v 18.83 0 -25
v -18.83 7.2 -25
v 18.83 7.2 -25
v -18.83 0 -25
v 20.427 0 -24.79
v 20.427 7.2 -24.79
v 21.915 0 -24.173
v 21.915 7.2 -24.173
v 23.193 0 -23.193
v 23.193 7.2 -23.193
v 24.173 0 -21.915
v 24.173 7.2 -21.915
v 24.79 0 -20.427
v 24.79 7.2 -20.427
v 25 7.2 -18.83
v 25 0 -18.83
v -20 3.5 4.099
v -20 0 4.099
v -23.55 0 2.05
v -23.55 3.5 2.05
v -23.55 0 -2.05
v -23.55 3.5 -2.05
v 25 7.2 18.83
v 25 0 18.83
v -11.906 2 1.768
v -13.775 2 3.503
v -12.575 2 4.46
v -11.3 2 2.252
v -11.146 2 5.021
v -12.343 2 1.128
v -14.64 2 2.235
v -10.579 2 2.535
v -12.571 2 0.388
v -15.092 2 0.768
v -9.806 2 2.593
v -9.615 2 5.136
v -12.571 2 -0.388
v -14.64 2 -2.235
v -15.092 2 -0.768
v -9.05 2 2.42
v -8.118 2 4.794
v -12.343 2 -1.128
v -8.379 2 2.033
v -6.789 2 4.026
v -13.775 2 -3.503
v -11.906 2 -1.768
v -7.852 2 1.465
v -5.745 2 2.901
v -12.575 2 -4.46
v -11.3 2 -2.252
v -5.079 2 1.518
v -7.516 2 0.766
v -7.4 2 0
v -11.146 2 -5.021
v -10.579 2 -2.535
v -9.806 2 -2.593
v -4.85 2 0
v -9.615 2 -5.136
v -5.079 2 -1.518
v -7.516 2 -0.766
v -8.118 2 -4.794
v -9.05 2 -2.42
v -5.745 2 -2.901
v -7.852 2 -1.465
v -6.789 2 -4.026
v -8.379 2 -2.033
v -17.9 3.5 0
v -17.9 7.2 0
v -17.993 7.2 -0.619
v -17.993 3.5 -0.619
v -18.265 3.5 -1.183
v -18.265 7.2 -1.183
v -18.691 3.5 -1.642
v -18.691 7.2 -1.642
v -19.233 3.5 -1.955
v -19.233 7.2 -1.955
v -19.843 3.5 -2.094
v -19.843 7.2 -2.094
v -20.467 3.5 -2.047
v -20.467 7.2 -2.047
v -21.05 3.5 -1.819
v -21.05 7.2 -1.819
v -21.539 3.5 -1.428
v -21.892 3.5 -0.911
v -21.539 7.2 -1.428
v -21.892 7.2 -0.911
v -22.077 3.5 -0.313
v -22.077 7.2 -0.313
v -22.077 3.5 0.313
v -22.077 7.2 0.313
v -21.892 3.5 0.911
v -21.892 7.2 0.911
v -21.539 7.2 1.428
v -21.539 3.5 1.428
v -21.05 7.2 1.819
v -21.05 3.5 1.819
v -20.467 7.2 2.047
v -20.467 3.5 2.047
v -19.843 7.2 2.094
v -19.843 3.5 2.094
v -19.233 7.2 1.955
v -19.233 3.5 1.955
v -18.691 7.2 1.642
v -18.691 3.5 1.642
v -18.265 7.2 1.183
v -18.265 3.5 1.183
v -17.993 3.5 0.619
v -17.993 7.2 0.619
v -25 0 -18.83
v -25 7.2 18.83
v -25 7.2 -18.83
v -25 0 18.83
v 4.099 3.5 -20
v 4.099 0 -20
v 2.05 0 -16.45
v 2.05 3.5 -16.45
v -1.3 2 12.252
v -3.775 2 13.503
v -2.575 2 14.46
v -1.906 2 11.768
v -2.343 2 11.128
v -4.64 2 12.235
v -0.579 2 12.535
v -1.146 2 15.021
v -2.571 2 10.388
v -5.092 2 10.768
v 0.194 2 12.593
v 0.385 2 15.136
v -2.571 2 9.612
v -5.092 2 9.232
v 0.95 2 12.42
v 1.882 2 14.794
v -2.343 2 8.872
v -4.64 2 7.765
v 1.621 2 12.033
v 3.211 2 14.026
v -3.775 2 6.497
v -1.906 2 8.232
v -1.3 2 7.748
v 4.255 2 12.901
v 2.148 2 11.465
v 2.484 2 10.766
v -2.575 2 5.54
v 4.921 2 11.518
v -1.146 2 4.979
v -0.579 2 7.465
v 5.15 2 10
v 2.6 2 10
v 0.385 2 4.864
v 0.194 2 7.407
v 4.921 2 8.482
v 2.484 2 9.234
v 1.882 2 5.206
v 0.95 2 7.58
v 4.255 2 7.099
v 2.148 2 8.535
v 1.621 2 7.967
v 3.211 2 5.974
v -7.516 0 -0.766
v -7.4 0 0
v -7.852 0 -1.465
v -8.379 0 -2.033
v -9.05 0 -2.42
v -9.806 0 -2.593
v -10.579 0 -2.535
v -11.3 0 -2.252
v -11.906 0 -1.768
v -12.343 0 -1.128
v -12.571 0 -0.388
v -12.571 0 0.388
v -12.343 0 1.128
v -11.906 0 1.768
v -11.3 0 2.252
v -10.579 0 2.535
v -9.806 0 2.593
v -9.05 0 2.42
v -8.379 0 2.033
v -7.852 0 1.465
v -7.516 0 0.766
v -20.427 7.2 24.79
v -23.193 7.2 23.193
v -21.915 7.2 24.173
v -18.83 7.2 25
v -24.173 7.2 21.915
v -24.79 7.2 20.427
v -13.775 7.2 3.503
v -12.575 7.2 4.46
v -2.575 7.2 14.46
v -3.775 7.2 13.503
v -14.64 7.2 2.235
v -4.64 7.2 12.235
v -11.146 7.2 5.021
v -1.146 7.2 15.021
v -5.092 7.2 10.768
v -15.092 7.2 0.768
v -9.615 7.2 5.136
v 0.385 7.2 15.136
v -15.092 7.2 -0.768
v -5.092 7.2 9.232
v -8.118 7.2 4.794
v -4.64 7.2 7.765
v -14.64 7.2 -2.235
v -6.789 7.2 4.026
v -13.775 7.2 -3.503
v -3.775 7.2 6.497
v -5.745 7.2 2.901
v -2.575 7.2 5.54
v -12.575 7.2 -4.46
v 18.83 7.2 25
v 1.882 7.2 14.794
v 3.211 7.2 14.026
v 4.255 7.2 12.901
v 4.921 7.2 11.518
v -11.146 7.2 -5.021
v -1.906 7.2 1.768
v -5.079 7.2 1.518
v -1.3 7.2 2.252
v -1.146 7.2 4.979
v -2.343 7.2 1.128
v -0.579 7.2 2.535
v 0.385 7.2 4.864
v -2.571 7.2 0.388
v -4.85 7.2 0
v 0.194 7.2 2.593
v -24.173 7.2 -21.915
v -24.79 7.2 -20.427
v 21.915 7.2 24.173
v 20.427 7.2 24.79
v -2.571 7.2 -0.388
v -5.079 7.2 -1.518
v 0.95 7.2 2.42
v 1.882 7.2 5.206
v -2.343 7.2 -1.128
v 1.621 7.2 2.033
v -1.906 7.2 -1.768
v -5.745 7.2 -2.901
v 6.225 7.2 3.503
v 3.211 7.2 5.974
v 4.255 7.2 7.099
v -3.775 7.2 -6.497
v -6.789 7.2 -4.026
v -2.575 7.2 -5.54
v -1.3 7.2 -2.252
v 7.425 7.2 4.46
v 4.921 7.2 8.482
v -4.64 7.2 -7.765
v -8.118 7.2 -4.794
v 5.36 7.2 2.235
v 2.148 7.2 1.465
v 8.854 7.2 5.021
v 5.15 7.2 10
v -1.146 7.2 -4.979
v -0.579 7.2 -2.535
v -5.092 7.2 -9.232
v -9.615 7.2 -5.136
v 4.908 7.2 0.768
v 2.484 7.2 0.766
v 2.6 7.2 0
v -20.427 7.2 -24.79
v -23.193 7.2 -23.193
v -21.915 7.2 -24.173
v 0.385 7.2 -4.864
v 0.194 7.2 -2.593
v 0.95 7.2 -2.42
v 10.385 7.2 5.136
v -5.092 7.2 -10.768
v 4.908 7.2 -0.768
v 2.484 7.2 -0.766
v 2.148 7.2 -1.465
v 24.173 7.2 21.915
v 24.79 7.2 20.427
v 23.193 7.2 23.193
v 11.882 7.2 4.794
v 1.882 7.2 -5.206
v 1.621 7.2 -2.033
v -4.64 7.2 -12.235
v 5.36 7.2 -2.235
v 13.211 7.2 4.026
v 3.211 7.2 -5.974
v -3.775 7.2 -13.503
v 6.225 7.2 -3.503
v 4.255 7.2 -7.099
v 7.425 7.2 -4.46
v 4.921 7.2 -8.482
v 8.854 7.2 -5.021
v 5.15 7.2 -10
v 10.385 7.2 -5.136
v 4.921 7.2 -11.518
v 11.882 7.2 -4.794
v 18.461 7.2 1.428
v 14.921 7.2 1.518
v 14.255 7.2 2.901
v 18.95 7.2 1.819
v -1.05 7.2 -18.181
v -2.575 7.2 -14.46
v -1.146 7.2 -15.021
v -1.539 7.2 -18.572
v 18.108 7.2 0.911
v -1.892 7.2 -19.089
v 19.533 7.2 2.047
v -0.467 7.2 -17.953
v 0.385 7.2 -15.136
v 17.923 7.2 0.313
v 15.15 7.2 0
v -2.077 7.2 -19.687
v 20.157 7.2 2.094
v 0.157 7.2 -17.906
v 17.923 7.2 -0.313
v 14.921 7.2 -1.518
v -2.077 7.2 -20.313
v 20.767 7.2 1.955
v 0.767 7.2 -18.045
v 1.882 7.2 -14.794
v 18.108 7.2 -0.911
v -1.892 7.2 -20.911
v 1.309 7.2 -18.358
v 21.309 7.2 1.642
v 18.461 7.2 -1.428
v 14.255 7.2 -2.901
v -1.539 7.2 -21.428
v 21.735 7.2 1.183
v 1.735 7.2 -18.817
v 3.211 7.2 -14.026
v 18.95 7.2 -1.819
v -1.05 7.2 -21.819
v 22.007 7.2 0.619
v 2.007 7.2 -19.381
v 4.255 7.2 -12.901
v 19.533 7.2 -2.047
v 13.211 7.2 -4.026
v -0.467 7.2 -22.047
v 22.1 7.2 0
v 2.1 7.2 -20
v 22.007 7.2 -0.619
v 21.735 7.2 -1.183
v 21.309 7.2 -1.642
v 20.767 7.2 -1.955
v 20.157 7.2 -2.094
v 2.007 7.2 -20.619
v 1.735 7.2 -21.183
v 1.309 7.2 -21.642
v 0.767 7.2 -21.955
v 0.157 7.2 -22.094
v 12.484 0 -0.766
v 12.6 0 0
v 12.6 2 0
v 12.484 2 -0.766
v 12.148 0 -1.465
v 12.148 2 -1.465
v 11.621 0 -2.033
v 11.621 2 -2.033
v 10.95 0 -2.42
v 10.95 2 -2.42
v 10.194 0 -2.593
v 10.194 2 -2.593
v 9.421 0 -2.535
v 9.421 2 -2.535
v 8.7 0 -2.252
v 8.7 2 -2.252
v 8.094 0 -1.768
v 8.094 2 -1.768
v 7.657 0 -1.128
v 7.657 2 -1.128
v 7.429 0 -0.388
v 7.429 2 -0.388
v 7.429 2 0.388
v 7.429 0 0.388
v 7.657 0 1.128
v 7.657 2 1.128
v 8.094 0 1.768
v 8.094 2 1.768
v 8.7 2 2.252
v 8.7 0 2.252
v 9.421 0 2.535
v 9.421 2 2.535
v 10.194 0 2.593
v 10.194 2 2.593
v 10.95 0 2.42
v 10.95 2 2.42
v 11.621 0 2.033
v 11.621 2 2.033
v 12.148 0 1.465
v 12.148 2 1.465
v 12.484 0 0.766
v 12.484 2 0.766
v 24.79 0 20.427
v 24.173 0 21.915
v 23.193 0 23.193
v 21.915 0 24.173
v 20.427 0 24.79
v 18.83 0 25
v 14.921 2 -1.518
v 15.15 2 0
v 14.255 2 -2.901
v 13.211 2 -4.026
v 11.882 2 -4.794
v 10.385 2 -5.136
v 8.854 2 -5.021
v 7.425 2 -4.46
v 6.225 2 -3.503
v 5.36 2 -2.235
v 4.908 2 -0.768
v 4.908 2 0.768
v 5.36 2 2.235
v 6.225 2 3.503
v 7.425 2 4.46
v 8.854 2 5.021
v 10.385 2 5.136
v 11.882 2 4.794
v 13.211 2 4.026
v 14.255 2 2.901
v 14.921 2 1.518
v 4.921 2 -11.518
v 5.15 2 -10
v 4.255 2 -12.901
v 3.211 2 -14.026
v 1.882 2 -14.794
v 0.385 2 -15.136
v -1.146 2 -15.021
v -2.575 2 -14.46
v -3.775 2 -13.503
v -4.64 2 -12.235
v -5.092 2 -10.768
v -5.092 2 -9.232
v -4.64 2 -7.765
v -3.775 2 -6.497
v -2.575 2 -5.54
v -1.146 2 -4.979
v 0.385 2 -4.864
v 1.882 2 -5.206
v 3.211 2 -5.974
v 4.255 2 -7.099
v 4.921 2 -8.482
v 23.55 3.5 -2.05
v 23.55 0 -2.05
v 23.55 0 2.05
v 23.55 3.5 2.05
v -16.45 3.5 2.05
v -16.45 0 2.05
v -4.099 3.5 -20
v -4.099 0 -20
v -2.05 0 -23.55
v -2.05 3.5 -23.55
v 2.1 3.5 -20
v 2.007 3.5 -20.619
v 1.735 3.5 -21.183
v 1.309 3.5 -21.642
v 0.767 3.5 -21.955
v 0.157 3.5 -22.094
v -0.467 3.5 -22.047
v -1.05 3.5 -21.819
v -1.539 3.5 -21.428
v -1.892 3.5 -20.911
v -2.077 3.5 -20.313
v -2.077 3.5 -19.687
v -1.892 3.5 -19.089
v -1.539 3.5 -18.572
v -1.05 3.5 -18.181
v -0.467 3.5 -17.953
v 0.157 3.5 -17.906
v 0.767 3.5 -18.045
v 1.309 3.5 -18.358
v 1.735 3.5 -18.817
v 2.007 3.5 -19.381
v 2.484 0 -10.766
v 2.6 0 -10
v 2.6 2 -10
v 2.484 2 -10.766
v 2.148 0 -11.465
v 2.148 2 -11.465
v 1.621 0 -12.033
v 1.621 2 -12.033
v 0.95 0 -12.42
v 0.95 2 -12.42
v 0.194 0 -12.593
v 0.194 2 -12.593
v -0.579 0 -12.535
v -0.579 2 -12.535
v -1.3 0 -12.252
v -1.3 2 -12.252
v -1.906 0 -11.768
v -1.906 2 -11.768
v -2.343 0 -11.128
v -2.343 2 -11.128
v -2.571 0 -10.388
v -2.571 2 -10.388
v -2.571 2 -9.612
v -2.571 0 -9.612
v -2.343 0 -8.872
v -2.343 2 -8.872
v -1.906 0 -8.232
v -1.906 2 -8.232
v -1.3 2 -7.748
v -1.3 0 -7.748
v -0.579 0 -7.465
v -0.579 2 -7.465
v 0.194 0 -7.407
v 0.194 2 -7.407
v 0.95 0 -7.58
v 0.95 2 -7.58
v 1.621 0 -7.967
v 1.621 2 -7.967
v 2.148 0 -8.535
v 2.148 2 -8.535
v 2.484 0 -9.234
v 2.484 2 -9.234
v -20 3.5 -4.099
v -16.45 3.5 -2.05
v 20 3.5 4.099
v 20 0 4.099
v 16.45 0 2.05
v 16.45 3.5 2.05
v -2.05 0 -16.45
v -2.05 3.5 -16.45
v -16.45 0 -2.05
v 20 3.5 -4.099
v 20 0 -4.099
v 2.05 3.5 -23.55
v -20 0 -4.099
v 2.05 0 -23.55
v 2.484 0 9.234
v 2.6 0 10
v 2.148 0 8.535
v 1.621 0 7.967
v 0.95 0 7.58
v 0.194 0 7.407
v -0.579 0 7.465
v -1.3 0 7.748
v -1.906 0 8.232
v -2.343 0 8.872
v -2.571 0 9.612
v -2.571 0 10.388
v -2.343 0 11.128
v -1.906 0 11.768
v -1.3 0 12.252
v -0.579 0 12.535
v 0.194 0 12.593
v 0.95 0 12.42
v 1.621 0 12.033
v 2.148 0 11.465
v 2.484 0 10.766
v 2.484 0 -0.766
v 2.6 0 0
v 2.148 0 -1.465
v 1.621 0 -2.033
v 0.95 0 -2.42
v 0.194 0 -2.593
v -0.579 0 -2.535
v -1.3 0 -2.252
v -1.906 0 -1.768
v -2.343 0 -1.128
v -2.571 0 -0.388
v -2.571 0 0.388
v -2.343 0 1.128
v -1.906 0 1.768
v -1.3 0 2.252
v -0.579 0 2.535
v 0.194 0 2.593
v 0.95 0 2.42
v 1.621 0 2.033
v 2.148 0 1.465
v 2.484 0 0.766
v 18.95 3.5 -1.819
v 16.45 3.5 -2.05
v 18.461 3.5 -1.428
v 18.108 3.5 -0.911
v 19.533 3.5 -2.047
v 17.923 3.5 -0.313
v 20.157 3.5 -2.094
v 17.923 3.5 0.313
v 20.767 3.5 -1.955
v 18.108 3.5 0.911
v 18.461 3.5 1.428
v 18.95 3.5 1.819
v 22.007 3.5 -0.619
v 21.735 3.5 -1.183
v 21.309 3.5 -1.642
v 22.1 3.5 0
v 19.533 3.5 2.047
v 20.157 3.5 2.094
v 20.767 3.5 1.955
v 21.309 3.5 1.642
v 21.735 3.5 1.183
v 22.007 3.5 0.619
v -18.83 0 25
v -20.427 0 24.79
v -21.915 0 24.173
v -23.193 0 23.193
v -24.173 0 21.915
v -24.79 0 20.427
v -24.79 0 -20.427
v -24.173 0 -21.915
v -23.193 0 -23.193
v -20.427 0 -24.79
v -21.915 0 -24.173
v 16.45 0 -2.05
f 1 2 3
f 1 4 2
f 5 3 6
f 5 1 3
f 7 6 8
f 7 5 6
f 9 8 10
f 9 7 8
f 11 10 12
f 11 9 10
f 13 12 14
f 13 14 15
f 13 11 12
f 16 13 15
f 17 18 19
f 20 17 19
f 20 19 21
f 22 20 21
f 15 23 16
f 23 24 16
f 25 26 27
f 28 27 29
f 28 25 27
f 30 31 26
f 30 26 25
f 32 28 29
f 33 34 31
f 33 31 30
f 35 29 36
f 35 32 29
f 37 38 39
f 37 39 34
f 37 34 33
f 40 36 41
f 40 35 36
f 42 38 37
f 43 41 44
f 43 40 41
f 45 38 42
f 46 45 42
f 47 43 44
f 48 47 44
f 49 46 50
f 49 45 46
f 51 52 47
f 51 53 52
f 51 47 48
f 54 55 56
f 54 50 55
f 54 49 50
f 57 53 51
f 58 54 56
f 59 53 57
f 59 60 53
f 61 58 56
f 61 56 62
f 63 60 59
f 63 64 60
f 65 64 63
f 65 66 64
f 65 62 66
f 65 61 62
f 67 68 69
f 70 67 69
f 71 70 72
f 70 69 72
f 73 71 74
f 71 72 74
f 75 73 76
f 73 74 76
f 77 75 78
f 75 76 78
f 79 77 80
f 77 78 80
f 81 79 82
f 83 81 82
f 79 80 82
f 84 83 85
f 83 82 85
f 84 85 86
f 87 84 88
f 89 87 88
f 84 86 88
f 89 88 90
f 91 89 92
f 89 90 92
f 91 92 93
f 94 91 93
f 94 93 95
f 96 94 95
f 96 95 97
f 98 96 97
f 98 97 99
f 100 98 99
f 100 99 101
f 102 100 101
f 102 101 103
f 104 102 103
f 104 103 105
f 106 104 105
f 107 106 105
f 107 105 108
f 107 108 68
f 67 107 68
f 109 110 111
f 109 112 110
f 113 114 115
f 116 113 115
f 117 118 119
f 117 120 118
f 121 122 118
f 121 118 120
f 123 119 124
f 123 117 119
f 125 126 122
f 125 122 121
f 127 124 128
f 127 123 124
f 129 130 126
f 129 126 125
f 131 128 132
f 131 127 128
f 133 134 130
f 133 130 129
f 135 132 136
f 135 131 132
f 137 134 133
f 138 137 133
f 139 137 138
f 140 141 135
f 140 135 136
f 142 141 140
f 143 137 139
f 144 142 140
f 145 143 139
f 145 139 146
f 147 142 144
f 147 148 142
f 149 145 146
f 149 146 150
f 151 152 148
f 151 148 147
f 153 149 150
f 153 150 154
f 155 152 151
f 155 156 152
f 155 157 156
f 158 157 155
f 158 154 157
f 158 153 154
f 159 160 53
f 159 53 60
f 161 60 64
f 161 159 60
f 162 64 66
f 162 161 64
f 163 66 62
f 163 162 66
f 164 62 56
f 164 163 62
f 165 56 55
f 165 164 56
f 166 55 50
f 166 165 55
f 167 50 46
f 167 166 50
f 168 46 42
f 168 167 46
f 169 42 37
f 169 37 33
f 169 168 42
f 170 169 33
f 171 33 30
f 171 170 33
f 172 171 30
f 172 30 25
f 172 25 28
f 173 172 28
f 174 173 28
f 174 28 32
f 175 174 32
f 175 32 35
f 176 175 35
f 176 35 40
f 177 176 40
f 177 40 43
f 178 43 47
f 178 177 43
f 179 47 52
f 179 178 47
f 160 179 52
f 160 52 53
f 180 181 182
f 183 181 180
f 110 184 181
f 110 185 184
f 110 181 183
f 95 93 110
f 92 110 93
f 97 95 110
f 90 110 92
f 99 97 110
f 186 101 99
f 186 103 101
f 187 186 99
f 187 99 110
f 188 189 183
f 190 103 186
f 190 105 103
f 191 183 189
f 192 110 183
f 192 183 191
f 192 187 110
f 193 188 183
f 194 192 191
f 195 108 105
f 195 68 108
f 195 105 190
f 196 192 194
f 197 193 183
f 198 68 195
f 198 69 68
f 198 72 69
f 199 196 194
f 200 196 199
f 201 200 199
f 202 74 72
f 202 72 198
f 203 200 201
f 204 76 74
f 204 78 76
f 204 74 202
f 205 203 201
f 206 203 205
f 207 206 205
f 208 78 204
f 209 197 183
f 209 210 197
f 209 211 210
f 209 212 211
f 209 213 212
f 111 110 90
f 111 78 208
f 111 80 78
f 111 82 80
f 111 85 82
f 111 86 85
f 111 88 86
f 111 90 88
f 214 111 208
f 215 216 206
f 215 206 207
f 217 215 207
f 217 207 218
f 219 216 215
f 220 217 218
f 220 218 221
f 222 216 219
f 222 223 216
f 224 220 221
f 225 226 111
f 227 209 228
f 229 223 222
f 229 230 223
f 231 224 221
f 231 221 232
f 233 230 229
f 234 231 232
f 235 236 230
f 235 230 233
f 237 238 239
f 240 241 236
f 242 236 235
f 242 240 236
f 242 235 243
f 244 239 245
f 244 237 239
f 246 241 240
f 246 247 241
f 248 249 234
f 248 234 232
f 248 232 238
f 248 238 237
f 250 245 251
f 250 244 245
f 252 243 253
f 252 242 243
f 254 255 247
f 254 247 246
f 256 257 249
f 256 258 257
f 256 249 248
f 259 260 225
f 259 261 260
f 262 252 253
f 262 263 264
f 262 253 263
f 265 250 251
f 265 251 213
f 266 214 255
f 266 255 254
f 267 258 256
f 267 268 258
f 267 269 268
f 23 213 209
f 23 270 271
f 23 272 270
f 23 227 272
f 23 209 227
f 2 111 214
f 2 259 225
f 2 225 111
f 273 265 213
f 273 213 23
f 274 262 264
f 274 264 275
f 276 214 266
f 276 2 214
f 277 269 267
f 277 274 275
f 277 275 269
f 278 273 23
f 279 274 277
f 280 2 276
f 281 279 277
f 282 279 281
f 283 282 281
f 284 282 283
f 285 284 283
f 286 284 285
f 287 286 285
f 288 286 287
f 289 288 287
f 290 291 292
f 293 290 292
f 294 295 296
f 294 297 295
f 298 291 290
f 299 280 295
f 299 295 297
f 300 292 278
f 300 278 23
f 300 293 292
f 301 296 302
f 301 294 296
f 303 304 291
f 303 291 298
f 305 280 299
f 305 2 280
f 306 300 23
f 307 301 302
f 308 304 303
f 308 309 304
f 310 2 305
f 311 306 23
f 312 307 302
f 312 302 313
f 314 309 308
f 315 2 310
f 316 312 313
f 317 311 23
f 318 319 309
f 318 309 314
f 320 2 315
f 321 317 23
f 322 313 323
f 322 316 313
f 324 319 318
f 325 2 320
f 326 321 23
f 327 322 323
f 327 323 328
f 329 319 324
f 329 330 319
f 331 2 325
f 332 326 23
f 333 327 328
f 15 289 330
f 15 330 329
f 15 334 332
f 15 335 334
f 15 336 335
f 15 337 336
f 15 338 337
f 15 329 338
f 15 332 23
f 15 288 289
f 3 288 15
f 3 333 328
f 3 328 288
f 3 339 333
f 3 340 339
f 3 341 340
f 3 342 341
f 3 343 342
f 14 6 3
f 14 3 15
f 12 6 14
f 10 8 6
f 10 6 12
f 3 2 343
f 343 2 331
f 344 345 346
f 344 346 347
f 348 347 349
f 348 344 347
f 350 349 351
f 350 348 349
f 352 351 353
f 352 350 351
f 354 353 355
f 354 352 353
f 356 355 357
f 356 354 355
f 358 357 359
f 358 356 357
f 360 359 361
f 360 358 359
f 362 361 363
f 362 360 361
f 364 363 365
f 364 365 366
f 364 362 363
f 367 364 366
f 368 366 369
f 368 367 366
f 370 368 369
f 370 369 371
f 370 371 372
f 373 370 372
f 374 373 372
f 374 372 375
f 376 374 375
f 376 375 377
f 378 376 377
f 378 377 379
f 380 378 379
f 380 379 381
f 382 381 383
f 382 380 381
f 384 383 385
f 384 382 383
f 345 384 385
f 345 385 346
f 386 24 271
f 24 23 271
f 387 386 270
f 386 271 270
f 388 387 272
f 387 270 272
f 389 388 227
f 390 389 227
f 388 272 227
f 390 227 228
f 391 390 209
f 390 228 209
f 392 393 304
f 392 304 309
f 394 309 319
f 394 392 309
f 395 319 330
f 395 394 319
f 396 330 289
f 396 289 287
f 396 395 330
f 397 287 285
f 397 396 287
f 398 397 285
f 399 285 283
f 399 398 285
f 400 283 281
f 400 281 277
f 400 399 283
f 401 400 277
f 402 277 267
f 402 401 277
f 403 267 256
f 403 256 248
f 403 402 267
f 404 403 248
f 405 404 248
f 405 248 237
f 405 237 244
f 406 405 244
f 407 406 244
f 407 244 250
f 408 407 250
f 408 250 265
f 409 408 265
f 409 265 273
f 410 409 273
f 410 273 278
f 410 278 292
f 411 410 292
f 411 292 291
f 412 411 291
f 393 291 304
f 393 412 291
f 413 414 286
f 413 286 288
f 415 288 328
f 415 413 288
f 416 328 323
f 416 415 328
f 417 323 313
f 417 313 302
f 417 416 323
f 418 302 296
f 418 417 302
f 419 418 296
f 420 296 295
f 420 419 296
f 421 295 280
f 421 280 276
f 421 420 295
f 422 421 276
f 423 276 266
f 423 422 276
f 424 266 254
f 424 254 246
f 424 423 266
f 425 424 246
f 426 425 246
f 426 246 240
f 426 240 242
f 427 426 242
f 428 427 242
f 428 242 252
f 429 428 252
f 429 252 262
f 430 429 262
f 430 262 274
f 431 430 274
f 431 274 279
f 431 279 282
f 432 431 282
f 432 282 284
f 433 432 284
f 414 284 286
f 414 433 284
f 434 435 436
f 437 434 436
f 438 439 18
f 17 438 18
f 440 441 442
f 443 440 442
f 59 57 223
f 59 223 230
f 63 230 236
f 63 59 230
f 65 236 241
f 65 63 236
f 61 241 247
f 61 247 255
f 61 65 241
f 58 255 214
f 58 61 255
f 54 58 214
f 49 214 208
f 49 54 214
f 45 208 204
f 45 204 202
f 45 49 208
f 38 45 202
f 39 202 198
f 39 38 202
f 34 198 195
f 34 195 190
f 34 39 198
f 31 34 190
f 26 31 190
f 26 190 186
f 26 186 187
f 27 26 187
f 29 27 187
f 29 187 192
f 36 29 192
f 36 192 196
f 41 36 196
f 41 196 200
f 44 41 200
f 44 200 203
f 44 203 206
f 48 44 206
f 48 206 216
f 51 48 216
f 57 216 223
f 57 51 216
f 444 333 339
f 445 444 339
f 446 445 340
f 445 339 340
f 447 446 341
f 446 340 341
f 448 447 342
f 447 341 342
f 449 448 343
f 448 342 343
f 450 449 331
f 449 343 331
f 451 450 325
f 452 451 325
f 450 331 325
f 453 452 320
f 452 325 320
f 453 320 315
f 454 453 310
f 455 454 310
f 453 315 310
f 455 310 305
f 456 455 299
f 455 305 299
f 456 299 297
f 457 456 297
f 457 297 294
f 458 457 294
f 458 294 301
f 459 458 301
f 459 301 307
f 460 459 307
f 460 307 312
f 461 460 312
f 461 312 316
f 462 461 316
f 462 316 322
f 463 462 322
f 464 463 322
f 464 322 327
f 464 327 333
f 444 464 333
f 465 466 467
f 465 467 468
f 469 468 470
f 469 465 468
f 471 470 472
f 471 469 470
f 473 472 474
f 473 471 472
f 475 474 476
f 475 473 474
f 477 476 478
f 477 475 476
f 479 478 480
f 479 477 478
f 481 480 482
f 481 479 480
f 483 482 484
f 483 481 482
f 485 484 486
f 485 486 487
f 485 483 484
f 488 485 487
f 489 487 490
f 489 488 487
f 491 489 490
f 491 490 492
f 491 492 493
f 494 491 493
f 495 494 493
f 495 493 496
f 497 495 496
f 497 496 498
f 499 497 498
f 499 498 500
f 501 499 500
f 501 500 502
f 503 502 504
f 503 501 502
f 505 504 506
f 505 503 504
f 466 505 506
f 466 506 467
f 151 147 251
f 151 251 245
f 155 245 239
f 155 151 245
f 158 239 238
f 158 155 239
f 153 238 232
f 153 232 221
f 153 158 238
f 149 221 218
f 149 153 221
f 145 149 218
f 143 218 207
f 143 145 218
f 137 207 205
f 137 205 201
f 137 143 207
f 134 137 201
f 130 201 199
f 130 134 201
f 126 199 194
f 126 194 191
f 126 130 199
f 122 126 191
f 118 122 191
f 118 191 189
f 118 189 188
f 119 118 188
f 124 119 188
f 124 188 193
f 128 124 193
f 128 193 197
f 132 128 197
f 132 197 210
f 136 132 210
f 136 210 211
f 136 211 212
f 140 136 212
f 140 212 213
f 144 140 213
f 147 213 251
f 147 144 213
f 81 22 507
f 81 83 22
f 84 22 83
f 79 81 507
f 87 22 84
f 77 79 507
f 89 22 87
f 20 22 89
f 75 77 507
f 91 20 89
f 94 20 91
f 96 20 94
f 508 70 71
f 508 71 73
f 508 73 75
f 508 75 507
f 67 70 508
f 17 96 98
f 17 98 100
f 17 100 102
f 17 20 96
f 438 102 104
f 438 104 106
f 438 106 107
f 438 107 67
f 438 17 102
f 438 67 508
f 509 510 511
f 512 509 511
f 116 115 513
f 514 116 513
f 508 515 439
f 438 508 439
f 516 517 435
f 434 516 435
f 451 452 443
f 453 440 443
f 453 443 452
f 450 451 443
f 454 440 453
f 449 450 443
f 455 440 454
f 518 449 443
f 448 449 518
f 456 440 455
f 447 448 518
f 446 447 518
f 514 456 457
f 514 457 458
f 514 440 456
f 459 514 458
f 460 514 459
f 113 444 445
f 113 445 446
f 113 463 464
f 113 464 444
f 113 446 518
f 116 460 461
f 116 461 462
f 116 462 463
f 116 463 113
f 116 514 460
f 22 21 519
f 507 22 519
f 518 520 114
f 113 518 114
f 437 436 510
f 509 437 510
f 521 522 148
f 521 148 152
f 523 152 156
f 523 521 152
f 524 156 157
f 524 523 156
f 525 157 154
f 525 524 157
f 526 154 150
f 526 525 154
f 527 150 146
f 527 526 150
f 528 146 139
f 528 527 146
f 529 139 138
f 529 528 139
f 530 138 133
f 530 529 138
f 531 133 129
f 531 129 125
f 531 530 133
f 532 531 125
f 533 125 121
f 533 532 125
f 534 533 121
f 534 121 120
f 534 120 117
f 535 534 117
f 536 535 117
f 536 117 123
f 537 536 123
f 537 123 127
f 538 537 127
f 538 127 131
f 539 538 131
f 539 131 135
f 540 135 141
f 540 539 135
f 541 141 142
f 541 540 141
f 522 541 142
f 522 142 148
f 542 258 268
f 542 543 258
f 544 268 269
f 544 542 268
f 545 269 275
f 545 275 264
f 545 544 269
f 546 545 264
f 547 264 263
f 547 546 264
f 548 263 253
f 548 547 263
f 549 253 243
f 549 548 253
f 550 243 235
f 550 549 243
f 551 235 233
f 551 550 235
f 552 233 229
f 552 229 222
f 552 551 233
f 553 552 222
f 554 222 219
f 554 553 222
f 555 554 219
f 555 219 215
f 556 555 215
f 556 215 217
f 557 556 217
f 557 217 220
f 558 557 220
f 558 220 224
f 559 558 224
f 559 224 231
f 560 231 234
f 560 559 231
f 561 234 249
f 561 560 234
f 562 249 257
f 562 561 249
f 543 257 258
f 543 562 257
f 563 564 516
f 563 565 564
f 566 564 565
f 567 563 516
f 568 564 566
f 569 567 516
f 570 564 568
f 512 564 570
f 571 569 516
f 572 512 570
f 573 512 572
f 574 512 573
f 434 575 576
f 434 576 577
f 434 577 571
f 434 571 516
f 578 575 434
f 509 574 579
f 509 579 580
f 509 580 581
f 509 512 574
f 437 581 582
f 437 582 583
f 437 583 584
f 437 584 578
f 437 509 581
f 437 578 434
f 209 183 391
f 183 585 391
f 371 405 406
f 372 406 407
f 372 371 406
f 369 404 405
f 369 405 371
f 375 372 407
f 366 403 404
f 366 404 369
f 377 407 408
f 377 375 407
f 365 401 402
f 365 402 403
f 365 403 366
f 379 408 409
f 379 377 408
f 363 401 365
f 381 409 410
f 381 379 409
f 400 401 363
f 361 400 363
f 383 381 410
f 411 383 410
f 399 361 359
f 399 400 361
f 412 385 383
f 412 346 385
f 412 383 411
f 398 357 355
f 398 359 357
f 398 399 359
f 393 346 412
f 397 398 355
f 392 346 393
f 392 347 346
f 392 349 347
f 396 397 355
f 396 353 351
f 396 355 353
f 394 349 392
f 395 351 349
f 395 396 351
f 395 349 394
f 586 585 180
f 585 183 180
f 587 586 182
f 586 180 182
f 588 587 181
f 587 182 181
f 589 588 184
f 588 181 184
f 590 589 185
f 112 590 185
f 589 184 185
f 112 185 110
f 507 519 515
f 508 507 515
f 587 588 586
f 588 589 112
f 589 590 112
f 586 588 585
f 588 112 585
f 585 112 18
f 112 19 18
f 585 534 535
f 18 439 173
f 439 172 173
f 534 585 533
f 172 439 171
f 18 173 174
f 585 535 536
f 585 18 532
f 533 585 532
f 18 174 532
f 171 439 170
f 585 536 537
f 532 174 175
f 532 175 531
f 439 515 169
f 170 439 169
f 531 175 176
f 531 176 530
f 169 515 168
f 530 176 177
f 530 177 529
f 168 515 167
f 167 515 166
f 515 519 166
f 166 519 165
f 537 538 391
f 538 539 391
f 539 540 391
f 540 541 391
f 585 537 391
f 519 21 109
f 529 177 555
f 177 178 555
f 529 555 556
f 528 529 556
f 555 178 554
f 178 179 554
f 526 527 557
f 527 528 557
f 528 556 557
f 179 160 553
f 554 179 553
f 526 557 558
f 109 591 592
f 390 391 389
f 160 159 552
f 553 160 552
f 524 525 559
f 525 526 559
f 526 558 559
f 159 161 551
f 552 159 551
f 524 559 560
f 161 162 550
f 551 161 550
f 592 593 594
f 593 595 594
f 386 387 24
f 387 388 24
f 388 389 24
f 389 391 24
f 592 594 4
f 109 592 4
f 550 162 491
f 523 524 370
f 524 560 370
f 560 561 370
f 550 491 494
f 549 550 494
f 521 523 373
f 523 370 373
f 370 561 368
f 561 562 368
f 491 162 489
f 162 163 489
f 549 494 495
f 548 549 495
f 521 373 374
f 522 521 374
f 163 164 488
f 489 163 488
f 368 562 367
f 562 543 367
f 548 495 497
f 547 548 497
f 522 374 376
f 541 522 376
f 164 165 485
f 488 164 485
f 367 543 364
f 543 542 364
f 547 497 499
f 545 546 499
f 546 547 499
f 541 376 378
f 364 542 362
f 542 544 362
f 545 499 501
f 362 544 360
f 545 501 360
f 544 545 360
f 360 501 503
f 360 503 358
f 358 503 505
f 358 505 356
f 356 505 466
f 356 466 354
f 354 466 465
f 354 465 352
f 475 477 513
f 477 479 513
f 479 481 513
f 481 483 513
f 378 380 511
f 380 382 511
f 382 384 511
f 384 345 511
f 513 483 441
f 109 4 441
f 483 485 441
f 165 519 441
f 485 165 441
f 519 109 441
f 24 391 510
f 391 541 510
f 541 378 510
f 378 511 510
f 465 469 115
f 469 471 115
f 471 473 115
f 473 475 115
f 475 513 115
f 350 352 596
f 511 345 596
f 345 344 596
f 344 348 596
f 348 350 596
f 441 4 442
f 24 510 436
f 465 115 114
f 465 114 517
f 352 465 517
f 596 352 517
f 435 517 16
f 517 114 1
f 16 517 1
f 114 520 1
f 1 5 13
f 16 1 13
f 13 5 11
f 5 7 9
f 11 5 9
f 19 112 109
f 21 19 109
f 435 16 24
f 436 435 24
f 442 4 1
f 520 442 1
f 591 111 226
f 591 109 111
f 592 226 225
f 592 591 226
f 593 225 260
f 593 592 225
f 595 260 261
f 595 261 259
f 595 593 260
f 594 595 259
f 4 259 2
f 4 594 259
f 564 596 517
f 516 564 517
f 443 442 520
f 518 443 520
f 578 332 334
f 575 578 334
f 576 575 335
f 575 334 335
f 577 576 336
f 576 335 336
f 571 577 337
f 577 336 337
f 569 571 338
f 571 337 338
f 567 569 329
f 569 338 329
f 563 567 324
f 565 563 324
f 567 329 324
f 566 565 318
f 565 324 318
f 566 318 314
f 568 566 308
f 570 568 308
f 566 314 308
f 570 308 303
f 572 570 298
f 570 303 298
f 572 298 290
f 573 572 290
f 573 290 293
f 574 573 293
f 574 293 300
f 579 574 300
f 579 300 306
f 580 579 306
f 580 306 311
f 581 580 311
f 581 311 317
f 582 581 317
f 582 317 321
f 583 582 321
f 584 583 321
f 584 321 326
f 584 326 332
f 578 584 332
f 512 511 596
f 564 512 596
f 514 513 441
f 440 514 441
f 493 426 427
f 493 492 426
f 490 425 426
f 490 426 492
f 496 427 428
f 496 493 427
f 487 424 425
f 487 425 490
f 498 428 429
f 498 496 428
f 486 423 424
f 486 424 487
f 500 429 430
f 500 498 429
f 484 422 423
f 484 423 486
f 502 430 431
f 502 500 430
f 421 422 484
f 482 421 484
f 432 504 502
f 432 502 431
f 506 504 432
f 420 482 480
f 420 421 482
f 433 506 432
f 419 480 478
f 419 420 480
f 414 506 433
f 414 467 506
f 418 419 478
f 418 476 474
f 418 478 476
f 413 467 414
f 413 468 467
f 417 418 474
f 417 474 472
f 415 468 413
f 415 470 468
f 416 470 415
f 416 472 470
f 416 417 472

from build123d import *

# Parameters (mm, degrees)
SKETCH_2_W          = 50
SKETCH_2_H          = 50
SKETCH_2_R          = 2.6
EXTRUDE_1_DEPTH     = 2
SKETCH_3_W          = 50
SKETCH_3_H          = 50
SKETCH_3_R          = 5.15
SKETCH_3_R_2        = 2.6
EXTRUDE_2_DEPTH     = 5.2
SKETCH_4_R          = 2.1
CUT_EXTRUDE_1_DEPTH = 10
CUT_EXTRUDE_2_DEPTH = 3.5
FILLET_1_R          = 6.17
FILLET_2_R          = 6.17
FILLET_3_R          = 6.17
FILLET_4_R          = 6.17


with BuildPart() as part:
    # 스케치2 → 보스-돌출1 (new body)
    with BuildSketch(Plane(origin=(0, 0, 0), x_dir=(1, 0, 0), z_dir=(0, 1, 0))):
        Rectangle(SKETCH_2_W, SKETCH_2_H)
        Circle(SKETCH_2_R, mode=Mode.SUBTRACT)
        with Locations((10, 0)):
            Circle(SKETCH_2_R, mode=Mode.SUBTRACT)
        with Locations((0, -10)):
            Circle(SKETCH_2_R, mode=Mode.SUBTRACT)
        with Locations((-10, 0)):
            Circle(SKETCH_2_R, mode=Mode.SUBTRACT)
        with Locations((0, 10)):
            Circle(SKETCH_2_R, mode=Mode.SUBTRACT)
    extrude(amount=EXTRUDE_1_DEPTH)

    # 스케치3 → 보스-돌출2 (add)
    with BuildSketch(Plane(origin=(0, 2, 0), x_dir=(1, 0, 0), z_dir=(0, 1, 0))):
        Rectangle(SKETCH_3_W, SKETCH_3_H)
        with Locations((0, -10)):
            Circle(SKETCH_3_R, mode=Mode.SUBTRACT)
        with Locations((-10, 0)):
            Circle(SKETCH_3_R, mode=Mode.SUBTRACT)
        Circle(SKETCH_3_R_2, mode=Mode.SUBTRACT)
        with Locations((10, 0)):
            Circle(SKETCH_3_R, mode=Mode.SUBTRACT)
        with Locations((0, 10)):
            Circle(SKETCH_3_R, mode=Mode.SUBTRACT)
    extrude(amount=EXTRUDE_2_DEPTH)

    # 스케치4 → 컷-돌출1 (cut)
    with BuildSketch(Plane(origin=(0, 7.2, 0), x_dir=(1, 0, 0), z_dir=(0, 1, 0))):
        with Locations((20, 0)):
            Circle(SKETCH_4_R)
        with Locations((0, 20)):
            Circle(SKETCH_4_R)
        with Locations((-20, 0)):
            Circle(SKETCH_4_R)
    extrude(amount=-CUT_EXTRUDE_1_DEPTH, mode=Mode.SUBTRACT)

    # 스케치6 → 컷-돌출2 (cut)
    with BuildSketch(Plane.XZ):
        Polygon((-16.45, -2.049593456), (-16.45, 2.049593456), (-20, 4.099186911), (-23.55, 2.049593456), (-23.55, -2.049593456), (-20, -4.099186911), align=None)
        Polygon((2.049593456, -16.45), (-2.049593456, -16.45), (-4.099186911, -20), (-2.049593456, -23.55), (2.049593456, -23.55), (4.099186911, -20), align=None)
        Polygon((16.45, 2.049593456), (16.45, -2.049593456), (20, -4.099186911), (23.55, -2.049593456), (23.55, 2.049593456), (20, 4.099186911), align=None)
    extrude(amount=-CUT_EXTRUDE_2_DEPTH, mode=Mode.SUBTRACT)

    # 필렛1
    fillet_1_edges = [part.edges().sort_by_distance(p)[0] for p in [
        (25, 3.6, -25),
    ]]
    fillet(fillet_1_edges, radius=FILLET_1_R)

    # 필렛2
    fillet_2_edges = [part.edges().sort_by_distance(p)[0] for p in [
        (25, 3.6, 25),
    ]]
    fillet(fillet_2_edges, radius=FILLET_2_R)

    # 필렛3
    fillet_3_edges = [part.edges().sort_by_distance(p)[0] for p in [
        (-25, 3.6, 25),
    ]]
    fillet(fillet_3_edges, radius=FILLET_3_R)

    # 필렛4
    fillet_4_edges = [part.edges().sort_by_distance(p)[0] for p in [
        (-25, 3.6, -25),
    ]]
    fillet(fillet_4_edges, radius=FILLET_4_R)


solid = part.part
